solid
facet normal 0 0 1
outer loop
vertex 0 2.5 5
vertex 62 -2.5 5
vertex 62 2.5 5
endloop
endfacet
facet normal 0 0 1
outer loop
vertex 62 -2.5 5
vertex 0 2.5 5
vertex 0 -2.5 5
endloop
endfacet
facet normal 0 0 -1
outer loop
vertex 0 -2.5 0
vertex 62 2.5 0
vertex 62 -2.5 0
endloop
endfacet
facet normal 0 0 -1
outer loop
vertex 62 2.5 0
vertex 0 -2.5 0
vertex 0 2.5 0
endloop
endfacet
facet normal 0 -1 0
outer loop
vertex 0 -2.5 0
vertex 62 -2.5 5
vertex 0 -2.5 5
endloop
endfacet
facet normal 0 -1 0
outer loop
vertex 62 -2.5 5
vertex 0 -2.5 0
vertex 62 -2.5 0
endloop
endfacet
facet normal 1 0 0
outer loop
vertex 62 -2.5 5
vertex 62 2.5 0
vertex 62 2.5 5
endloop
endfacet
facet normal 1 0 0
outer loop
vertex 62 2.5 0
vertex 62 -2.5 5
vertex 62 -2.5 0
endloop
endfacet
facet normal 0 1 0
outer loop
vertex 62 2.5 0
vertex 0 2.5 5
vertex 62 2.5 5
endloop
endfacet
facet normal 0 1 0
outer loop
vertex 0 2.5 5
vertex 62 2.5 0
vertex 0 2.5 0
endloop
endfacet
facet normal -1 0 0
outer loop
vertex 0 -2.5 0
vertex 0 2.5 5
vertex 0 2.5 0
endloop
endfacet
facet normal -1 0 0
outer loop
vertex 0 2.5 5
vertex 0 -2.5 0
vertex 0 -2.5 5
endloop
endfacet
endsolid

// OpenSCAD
// file: Library/center.scad
module center(axis){
	translate((axis / -2.0)){
		children();
	}
}
// main file
use <Library/center.scad>

//This rod is positive space for the full ejector rod, and negative space that gets cut out of the dispenser.

//Length, width, and height of rod. Length should include the thiccness of the paddle.
dimensions = [30+2+30, 5, 5];

module CylinderDispenser_Dispenser_EjectorHole(dimensions){
	center([0, dimensions.y, 0]){
		cube(dimensions);
	}
}

CylinderDispenser_Dispenser_EjectorHole(dimensions);
